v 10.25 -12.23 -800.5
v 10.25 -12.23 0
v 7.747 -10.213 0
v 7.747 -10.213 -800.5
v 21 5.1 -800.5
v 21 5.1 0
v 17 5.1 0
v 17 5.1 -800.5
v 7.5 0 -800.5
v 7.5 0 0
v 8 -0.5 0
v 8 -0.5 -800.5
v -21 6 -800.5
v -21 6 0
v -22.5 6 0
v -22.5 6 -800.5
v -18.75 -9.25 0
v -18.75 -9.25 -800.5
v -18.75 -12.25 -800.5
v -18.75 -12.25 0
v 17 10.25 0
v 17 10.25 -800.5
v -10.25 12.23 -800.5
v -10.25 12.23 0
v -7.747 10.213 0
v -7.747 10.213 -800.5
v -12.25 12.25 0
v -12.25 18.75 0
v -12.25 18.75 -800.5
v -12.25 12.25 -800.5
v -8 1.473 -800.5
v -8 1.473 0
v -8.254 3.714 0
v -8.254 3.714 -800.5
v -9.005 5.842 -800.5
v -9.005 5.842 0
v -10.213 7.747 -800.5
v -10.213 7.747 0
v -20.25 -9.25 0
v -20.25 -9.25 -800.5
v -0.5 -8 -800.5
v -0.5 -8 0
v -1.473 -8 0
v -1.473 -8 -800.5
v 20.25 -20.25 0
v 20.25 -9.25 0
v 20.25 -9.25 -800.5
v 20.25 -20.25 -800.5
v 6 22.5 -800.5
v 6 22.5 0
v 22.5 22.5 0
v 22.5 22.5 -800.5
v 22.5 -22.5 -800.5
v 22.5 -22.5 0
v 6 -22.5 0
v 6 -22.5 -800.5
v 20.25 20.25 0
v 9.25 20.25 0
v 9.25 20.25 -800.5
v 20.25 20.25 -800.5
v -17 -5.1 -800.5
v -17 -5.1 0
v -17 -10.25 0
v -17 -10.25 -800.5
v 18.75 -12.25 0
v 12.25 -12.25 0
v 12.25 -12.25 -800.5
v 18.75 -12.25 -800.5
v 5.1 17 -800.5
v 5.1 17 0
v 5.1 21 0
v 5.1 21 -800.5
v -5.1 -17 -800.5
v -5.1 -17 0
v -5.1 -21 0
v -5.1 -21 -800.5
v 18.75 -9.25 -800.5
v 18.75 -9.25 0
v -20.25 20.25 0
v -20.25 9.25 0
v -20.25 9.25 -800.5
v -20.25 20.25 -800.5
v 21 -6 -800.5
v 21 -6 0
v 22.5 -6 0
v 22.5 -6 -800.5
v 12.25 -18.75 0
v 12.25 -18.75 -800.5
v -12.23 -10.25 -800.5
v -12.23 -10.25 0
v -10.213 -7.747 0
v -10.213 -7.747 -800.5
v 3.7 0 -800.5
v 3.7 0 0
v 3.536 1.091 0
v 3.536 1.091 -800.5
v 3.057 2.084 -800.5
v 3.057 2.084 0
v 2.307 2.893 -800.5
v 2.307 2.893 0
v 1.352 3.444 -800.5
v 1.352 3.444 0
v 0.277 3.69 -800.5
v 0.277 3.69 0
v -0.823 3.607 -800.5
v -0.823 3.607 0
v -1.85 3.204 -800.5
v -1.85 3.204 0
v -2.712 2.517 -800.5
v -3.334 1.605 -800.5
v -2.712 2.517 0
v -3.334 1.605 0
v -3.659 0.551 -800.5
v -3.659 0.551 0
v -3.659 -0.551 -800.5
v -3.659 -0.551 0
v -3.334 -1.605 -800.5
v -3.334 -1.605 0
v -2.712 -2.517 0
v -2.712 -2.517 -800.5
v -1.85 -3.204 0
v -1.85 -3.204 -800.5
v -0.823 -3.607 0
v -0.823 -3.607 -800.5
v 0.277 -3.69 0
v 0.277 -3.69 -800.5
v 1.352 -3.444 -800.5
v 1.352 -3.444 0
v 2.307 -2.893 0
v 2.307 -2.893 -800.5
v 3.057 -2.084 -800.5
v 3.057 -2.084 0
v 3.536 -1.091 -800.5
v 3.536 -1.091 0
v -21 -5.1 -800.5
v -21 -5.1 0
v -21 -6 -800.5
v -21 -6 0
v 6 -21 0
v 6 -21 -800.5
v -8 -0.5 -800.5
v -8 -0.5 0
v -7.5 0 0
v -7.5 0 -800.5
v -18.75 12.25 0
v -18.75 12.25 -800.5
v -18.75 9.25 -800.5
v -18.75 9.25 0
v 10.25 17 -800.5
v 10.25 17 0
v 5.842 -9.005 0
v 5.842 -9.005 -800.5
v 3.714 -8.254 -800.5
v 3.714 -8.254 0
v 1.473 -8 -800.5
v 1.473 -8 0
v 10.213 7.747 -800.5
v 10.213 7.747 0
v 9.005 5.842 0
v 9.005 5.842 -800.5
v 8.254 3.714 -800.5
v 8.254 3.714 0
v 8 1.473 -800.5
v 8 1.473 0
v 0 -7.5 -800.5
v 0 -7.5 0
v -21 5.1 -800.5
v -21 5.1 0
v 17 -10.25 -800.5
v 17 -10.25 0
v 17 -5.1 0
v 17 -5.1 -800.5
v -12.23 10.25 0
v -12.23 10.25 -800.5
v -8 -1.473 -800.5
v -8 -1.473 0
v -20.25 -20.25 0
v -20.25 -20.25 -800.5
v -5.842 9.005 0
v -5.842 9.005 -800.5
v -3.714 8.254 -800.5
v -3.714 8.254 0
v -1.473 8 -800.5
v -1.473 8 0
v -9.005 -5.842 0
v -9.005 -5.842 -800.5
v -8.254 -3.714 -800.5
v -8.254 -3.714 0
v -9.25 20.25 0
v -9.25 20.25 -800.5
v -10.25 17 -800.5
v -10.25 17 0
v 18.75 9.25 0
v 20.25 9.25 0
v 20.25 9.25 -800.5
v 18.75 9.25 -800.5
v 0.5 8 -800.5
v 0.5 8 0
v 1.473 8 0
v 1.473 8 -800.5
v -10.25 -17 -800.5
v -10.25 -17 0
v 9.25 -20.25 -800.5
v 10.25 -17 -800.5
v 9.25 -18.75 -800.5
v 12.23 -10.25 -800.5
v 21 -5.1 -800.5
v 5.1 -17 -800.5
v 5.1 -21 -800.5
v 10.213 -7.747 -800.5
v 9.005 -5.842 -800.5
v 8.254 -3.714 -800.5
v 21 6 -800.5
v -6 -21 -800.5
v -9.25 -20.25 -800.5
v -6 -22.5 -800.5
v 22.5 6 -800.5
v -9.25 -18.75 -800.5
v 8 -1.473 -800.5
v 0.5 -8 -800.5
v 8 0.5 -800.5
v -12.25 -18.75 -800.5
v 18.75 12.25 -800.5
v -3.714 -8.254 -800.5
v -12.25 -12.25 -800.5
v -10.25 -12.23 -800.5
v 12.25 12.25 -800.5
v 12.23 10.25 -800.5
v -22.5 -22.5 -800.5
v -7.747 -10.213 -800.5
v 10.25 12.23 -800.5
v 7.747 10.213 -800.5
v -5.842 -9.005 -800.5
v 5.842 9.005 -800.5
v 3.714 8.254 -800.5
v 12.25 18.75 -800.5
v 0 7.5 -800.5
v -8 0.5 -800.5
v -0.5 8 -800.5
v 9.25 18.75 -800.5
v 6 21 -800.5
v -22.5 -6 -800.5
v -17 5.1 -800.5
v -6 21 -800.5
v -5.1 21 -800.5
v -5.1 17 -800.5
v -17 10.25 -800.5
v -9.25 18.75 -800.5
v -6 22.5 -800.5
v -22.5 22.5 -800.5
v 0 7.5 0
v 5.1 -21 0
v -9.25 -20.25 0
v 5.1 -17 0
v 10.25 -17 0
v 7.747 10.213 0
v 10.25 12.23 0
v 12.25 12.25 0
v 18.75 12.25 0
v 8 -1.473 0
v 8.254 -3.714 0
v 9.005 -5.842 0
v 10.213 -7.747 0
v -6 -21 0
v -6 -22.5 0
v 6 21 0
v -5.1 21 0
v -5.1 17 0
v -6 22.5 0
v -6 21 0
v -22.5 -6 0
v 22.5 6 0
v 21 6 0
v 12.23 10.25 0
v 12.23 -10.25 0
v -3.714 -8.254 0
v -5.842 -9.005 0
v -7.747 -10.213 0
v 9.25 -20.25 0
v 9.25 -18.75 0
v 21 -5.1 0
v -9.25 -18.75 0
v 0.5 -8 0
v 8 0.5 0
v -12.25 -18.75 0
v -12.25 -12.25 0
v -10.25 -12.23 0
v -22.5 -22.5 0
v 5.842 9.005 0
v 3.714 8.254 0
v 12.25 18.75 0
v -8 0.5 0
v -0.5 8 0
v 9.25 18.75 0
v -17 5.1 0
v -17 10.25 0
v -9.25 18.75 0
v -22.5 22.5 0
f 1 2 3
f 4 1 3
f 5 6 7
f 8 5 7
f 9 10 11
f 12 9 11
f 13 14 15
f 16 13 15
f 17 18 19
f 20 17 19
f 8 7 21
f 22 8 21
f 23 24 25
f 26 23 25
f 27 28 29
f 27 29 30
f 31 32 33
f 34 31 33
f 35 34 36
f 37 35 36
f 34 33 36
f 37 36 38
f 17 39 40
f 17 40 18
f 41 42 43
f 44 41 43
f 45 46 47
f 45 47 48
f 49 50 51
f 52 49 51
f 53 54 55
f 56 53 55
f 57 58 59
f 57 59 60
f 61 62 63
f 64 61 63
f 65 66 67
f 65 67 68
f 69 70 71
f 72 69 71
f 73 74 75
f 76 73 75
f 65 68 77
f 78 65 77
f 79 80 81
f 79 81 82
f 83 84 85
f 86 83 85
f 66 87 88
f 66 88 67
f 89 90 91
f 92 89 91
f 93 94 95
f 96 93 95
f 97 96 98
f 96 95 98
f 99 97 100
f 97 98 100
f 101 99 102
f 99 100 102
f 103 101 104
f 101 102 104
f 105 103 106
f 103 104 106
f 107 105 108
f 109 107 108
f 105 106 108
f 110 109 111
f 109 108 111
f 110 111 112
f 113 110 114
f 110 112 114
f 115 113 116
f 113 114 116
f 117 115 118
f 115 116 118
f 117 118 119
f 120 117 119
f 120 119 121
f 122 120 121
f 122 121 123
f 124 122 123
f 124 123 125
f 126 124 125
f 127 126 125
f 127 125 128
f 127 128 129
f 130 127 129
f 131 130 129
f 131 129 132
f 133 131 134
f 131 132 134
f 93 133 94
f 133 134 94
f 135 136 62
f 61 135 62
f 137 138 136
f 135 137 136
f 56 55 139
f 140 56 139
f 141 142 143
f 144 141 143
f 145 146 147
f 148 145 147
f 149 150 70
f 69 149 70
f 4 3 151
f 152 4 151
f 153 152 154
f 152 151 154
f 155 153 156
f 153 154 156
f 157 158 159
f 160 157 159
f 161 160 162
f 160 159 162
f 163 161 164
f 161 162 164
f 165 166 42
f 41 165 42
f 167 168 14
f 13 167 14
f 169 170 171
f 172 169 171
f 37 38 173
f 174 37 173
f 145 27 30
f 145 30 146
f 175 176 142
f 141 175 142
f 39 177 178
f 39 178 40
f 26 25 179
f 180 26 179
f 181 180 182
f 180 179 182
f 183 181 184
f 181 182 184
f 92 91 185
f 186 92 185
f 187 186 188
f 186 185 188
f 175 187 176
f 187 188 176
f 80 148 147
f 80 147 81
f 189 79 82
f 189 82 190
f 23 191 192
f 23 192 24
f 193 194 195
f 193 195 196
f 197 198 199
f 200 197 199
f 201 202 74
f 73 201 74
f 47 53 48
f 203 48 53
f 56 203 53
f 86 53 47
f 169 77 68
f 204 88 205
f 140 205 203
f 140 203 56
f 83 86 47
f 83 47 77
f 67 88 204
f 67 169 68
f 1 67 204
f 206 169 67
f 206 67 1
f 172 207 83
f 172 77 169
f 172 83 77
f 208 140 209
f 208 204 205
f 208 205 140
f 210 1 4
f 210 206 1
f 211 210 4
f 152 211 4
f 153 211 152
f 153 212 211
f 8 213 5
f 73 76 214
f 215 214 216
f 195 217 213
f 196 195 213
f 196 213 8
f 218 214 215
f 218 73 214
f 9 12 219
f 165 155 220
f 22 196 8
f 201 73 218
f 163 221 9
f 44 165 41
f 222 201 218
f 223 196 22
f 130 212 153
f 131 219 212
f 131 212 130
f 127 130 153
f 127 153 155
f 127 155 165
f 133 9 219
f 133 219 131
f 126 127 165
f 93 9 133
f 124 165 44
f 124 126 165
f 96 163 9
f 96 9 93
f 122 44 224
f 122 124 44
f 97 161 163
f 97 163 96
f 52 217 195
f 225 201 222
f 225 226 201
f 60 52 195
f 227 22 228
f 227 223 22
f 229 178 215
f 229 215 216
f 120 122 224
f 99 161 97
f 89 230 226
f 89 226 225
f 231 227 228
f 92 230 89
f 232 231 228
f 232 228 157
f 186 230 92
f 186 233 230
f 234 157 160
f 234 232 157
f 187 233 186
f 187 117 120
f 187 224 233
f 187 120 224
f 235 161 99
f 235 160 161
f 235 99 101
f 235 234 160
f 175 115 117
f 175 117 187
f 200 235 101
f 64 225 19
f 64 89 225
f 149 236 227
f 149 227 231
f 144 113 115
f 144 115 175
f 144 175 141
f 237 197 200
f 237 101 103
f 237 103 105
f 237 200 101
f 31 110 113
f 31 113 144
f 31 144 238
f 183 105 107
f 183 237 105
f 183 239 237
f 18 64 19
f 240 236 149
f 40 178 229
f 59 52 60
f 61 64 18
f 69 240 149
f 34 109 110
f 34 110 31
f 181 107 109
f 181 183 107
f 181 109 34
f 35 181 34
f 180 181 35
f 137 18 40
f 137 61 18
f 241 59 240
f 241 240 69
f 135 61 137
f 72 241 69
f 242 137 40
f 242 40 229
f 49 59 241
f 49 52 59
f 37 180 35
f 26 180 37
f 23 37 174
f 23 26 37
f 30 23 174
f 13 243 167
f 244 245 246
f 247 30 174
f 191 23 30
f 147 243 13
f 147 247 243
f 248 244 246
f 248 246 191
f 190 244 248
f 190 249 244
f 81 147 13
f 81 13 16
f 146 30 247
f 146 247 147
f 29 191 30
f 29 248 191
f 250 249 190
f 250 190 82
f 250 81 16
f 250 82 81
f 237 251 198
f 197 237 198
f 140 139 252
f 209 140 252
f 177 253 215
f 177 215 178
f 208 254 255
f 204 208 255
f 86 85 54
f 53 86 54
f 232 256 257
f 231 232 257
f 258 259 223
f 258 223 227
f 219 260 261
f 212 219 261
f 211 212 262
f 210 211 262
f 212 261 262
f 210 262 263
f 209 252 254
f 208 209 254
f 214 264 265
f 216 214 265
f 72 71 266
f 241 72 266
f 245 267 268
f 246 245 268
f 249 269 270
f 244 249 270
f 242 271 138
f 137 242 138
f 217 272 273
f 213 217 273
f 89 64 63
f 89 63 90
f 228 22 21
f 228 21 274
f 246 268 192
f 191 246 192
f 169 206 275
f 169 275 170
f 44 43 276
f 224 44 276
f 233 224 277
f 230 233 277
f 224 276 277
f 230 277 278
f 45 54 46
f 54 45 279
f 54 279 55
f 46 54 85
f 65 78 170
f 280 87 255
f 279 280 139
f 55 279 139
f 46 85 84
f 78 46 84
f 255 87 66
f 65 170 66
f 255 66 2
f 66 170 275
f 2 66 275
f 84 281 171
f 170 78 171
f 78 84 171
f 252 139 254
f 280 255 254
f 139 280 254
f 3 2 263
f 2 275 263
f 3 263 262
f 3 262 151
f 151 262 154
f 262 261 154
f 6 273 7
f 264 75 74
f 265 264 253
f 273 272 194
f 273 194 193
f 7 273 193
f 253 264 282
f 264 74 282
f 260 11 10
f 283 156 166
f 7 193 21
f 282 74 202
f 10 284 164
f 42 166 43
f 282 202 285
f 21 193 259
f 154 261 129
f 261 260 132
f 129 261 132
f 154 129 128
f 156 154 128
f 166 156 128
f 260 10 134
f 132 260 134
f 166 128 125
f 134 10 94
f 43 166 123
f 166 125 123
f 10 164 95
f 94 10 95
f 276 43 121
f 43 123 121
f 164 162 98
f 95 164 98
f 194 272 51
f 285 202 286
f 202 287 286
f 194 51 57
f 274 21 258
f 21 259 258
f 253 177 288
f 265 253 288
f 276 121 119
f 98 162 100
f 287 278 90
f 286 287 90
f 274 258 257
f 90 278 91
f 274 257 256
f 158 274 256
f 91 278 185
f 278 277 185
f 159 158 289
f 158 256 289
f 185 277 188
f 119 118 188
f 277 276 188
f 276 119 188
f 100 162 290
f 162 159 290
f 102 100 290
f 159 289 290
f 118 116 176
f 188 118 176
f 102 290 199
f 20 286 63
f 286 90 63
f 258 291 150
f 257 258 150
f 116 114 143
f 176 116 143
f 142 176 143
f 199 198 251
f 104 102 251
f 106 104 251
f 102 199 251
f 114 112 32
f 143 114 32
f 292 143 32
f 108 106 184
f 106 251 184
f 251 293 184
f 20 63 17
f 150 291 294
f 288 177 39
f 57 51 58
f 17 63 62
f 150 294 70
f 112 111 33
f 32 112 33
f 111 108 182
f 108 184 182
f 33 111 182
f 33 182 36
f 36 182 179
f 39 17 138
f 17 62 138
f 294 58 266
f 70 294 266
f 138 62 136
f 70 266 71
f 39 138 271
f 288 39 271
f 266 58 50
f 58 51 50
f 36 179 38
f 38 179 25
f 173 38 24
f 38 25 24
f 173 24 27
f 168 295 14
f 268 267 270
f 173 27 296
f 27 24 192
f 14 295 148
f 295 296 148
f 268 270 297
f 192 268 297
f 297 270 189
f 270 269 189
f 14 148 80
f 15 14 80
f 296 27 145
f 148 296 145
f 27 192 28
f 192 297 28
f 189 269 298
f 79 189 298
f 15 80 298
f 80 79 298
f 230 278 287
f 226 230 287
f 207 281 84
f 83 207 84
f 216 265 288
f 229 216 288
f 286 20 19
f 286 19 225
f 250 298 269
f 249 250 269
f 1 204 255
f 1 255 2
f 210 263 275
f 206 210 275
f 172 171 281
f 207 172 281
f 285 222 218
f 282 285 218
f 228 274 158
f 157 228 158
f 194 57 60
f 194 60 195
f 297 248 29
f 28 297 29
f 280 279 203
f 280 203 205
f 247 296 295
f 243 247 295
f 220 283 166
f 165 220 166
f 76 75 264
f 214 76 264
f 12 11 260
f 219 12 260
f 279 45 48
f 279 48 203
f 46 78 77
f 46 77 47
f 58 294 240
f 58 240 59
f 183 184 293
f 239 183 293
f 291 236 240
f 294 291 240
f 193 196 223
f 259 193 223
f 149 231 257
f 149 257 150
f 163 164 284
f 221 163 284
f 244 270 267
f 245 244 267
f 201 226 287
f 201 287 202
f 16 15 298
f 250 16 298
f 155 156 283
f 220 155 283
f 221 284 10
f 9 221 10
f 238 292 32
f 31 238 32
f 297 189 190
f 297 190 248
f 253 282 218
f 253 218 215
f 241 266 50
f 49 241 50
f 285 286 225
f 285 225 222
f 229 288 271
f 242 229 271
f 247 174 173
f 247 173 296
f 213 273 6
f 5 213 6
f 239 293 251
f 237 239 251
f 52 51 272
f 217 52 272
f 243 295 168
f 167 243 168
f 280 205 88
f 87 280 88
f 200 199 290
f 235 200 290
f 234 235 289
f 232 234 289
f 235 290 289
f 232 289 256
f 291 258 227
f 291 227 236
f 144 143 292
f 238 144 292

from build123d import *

# Parameters (mm, degrees)
MODEL_R             = 3.7
BOSS_EXTRUDE1_DEPTH = 800.5


with BuildPart() as part:
    # Model → Boss-Extrude1 (new body)
    with BuildSketch(Plane.XY):
        with BuildLine():
            Line((0.5, 8), (1.472732261, 8))
            ThreePointArc((1.472732261, 8), (4.799135414, 8.56946226), (7.746686356, 10.212991588))
            Line((7.746686356, 10.212991588), (10.25, 12.229898987))
            Line((10.25, 12.229898987), (10.25, 17))
            Line((10.25, 17), (5.1, 17))
            Line((5.1, 17), (5.1, 21))
            Line((5.1, 21), (5.999986755, 21))
            Line((5.999986755, 21), (5.999986755, 22.5))
            Line((5.999986755, 22.5), (22.5, 22.5))
            Line((22.5, 22.5), (22.5, 5.999986755))
            Line((22.5, 5.999986755), (21, 5.999986755))
            Line((21, 5.999986755), (21, 5.1))
            Line((21, 5.1), (17, 5.1))
            Line((17, 5.1), (17, 10.25))
            Line((17, 10.25), (12.229898987, 10.25))
            Line((12.229898987, 10.25), (10.212991588, 7.746686356))
            ThreePointArc((10.212991588, 7.746686356), (8.56946226, 4.799135414), (8, 1.472732261))
            Line((8, 1.472732261), (8, 0.5))
            Line((8, 0.5), (7.5, 0))
            Line((7.5, 0), (8, -0.5))
            Line((8, -0.5), (8, -1.472732261))
            ThreePointArc((8, -1.472732261), (8.56946226, -4.799135414), (10.212991588, -7.746686356))
            Line((10.212991588, -7.746686356), (12.229898987, -10.25))
            Line((12.229898987, -10.25), (17, -10.25))
            Line((17, -10.25), (17, -5.1))
            Line((17, -5.1), (21, -5.1))
            Line((21, -5.1), (21, -6.000013245))
            Line((21, -6.000013245), (22.5, -6.000013245))
            Line((22.5, -6.000013245), (22.5, -22.5))
            Line((22.5, -22.5), (6.000013245, -22.5))
            Line((6.000013245, -22.5), (6.000013245, -21))
            Line((6.000013245, -21), (5.1, -21))
            Line((5.1, -21), (5.1, -17))
            Line((5.1, -17), (10.25, -17))
            Line((10.25, -17), (10.25, -12.229898987))
            Line((10.25, -12.229898987), (7.746686356, -10.212991588))
            ThreePointArc((7.746686356, -10.212991588), (4.799135414, -8.56946226), (1.472732261, -8))
            Line((1.472732261, -8), (0.5, -8))
            Line((0.5, -8), (0, -7.5))
            Line((0, -7.5), (-0.5, -8))
            Line((-0.5, -8), (-1.472732261, -8))
            ThreePointArc((-1.472732261, -8), (-4.799135414, -8.56946226), (-7.746686356, -10.212991588))
            Line((-7.746686356, -10.212991588), (-10.25, -12.229898987))
            Line((-10.25, -12.229898987), (-10.25, -17))
            Line((-10.25, -17), (-5.1, -17))
            Line((-5.1, -17), (-5.1, -21))
            Line((-5.1, -21), (-5.999986755, -21))
            Line((-5.999986755, -21), (-5.999986755, -22.5))
            Line((-5.999986755, -22.5), (-22.5, -22.5))
            Line((-22.5, -22.5), (-22.5, -5.999986755))
            Line((-22.5, -5.999986755), (-21, -5.999986755))
            Line((-21, -5.999986755), (-21, -5.1))
            Line((-21, -5.1), (-17, -5.1))
            Line((-17, -5.1), (-17, -10.25))
            Line((-17, -10.25), (-12.229898987, -10.25))
            Line((-12.229898987, -10.25), (-10.212991588, -7.746686356))
            ThreePointArc((-10.212991588, -7.746686356), (-8.56946226, -4.799135414), (-8, -1.472732261))
            Line((-8, -1.472732261), (-8, -0.5))
            Line((-8, -0.5), (-7.5, 0))
            Line((-7.5, 0), (-8, 0.5))
            Line((-8, 0.5), (-8, 1.472732261))
            ThreePointArc((-8, 1.472732261), (-8.56946226, 4.799135414), (-10.212991588, 7.746686356))
            Line((-10.212991588, 7.746686356), (-12.229898987, 10.25))
            Line((-12.229898987, 10.25), (-17, 10.25))
            Line((-17, 10.25), (-17, 5.1))
            Line((-17, 5.1), (-21, 5.1))
            Line((-21, 5.1), (-21, 6.000013245))
            Line((-21, 6.000013245), (-22.5, 6.000013245))
            Line((-22.5, 6.000013245), (-22.5, 22.5))
            Line((-22.5, 22.5), (-6.000013245, 22.5))
            Line((-6.000013245, 22.5), (-6.000013245, 21))
            Line((-6.000013245, 21), (-5.1, 21))
            Line((-5.1, 21), (-5.1, 17))
            Line((-5.1, 17), (-10.25, 17))
            Line((-10.25, 17), (-10.25, 12.229898987))
            Line((-10.25, 12.229898987), (-7.746686356, 10.212991588))
            ThreePointArc((-7.746686356, 10.212991588), (-4.799135414, 8.56946226), (-1.472732261, 8))
            Line((-1.472732261, 8), (-0.5, 8))
            Line((-0.5, 8), (0, 7.5))
            Line((0, 7.5), (0.5, 8))
        make_face()
        Circle(MODEL_R, mode=Mode.SUBTRACT)
        Polygon((20.25, -9.25), (20.25, -20.25), (9.25, -20.25), (9.25, -18.75), (12.25, -18.75), (12.25, -12.25), (18.75, -12.25), (18.75, -9.25), align=None, mode=Mode.SUBTRACT)
        Polygon((9.25, 20.25), (20.25, 20.25), (20.25, 9.25), (18.75, 9.25), (18.75, 12.25), (12.25, 12.25), (12.25, 18.75), (9.25, 18.75), align=None, mode=Mode.SUBTRACT)
        Polygon((-9.25, -20.25), (-20.25, -20.25), (-20.25, -9.25), (-18.75, -9.25), (-18.75, -12.25), (-12.25, -12.25), (-12.25, -18.75), (-9.25, -18.75), align=None, mode=Mode.SUBTRACT)
        Polygon((-20.25, 20.25), (-9.25, 20.25), (-9.25, 18.75), (-12.25, 18.75), (-12.25, 12.25), (-18.75, 12.25), (-18.75, 9.25), (-20.25, 9.25), align=None, mode=Mode.SUBTRACT)
    extrude(amount=-BOSS_EXTRUDE1_DEPTH)


solid = part.part
